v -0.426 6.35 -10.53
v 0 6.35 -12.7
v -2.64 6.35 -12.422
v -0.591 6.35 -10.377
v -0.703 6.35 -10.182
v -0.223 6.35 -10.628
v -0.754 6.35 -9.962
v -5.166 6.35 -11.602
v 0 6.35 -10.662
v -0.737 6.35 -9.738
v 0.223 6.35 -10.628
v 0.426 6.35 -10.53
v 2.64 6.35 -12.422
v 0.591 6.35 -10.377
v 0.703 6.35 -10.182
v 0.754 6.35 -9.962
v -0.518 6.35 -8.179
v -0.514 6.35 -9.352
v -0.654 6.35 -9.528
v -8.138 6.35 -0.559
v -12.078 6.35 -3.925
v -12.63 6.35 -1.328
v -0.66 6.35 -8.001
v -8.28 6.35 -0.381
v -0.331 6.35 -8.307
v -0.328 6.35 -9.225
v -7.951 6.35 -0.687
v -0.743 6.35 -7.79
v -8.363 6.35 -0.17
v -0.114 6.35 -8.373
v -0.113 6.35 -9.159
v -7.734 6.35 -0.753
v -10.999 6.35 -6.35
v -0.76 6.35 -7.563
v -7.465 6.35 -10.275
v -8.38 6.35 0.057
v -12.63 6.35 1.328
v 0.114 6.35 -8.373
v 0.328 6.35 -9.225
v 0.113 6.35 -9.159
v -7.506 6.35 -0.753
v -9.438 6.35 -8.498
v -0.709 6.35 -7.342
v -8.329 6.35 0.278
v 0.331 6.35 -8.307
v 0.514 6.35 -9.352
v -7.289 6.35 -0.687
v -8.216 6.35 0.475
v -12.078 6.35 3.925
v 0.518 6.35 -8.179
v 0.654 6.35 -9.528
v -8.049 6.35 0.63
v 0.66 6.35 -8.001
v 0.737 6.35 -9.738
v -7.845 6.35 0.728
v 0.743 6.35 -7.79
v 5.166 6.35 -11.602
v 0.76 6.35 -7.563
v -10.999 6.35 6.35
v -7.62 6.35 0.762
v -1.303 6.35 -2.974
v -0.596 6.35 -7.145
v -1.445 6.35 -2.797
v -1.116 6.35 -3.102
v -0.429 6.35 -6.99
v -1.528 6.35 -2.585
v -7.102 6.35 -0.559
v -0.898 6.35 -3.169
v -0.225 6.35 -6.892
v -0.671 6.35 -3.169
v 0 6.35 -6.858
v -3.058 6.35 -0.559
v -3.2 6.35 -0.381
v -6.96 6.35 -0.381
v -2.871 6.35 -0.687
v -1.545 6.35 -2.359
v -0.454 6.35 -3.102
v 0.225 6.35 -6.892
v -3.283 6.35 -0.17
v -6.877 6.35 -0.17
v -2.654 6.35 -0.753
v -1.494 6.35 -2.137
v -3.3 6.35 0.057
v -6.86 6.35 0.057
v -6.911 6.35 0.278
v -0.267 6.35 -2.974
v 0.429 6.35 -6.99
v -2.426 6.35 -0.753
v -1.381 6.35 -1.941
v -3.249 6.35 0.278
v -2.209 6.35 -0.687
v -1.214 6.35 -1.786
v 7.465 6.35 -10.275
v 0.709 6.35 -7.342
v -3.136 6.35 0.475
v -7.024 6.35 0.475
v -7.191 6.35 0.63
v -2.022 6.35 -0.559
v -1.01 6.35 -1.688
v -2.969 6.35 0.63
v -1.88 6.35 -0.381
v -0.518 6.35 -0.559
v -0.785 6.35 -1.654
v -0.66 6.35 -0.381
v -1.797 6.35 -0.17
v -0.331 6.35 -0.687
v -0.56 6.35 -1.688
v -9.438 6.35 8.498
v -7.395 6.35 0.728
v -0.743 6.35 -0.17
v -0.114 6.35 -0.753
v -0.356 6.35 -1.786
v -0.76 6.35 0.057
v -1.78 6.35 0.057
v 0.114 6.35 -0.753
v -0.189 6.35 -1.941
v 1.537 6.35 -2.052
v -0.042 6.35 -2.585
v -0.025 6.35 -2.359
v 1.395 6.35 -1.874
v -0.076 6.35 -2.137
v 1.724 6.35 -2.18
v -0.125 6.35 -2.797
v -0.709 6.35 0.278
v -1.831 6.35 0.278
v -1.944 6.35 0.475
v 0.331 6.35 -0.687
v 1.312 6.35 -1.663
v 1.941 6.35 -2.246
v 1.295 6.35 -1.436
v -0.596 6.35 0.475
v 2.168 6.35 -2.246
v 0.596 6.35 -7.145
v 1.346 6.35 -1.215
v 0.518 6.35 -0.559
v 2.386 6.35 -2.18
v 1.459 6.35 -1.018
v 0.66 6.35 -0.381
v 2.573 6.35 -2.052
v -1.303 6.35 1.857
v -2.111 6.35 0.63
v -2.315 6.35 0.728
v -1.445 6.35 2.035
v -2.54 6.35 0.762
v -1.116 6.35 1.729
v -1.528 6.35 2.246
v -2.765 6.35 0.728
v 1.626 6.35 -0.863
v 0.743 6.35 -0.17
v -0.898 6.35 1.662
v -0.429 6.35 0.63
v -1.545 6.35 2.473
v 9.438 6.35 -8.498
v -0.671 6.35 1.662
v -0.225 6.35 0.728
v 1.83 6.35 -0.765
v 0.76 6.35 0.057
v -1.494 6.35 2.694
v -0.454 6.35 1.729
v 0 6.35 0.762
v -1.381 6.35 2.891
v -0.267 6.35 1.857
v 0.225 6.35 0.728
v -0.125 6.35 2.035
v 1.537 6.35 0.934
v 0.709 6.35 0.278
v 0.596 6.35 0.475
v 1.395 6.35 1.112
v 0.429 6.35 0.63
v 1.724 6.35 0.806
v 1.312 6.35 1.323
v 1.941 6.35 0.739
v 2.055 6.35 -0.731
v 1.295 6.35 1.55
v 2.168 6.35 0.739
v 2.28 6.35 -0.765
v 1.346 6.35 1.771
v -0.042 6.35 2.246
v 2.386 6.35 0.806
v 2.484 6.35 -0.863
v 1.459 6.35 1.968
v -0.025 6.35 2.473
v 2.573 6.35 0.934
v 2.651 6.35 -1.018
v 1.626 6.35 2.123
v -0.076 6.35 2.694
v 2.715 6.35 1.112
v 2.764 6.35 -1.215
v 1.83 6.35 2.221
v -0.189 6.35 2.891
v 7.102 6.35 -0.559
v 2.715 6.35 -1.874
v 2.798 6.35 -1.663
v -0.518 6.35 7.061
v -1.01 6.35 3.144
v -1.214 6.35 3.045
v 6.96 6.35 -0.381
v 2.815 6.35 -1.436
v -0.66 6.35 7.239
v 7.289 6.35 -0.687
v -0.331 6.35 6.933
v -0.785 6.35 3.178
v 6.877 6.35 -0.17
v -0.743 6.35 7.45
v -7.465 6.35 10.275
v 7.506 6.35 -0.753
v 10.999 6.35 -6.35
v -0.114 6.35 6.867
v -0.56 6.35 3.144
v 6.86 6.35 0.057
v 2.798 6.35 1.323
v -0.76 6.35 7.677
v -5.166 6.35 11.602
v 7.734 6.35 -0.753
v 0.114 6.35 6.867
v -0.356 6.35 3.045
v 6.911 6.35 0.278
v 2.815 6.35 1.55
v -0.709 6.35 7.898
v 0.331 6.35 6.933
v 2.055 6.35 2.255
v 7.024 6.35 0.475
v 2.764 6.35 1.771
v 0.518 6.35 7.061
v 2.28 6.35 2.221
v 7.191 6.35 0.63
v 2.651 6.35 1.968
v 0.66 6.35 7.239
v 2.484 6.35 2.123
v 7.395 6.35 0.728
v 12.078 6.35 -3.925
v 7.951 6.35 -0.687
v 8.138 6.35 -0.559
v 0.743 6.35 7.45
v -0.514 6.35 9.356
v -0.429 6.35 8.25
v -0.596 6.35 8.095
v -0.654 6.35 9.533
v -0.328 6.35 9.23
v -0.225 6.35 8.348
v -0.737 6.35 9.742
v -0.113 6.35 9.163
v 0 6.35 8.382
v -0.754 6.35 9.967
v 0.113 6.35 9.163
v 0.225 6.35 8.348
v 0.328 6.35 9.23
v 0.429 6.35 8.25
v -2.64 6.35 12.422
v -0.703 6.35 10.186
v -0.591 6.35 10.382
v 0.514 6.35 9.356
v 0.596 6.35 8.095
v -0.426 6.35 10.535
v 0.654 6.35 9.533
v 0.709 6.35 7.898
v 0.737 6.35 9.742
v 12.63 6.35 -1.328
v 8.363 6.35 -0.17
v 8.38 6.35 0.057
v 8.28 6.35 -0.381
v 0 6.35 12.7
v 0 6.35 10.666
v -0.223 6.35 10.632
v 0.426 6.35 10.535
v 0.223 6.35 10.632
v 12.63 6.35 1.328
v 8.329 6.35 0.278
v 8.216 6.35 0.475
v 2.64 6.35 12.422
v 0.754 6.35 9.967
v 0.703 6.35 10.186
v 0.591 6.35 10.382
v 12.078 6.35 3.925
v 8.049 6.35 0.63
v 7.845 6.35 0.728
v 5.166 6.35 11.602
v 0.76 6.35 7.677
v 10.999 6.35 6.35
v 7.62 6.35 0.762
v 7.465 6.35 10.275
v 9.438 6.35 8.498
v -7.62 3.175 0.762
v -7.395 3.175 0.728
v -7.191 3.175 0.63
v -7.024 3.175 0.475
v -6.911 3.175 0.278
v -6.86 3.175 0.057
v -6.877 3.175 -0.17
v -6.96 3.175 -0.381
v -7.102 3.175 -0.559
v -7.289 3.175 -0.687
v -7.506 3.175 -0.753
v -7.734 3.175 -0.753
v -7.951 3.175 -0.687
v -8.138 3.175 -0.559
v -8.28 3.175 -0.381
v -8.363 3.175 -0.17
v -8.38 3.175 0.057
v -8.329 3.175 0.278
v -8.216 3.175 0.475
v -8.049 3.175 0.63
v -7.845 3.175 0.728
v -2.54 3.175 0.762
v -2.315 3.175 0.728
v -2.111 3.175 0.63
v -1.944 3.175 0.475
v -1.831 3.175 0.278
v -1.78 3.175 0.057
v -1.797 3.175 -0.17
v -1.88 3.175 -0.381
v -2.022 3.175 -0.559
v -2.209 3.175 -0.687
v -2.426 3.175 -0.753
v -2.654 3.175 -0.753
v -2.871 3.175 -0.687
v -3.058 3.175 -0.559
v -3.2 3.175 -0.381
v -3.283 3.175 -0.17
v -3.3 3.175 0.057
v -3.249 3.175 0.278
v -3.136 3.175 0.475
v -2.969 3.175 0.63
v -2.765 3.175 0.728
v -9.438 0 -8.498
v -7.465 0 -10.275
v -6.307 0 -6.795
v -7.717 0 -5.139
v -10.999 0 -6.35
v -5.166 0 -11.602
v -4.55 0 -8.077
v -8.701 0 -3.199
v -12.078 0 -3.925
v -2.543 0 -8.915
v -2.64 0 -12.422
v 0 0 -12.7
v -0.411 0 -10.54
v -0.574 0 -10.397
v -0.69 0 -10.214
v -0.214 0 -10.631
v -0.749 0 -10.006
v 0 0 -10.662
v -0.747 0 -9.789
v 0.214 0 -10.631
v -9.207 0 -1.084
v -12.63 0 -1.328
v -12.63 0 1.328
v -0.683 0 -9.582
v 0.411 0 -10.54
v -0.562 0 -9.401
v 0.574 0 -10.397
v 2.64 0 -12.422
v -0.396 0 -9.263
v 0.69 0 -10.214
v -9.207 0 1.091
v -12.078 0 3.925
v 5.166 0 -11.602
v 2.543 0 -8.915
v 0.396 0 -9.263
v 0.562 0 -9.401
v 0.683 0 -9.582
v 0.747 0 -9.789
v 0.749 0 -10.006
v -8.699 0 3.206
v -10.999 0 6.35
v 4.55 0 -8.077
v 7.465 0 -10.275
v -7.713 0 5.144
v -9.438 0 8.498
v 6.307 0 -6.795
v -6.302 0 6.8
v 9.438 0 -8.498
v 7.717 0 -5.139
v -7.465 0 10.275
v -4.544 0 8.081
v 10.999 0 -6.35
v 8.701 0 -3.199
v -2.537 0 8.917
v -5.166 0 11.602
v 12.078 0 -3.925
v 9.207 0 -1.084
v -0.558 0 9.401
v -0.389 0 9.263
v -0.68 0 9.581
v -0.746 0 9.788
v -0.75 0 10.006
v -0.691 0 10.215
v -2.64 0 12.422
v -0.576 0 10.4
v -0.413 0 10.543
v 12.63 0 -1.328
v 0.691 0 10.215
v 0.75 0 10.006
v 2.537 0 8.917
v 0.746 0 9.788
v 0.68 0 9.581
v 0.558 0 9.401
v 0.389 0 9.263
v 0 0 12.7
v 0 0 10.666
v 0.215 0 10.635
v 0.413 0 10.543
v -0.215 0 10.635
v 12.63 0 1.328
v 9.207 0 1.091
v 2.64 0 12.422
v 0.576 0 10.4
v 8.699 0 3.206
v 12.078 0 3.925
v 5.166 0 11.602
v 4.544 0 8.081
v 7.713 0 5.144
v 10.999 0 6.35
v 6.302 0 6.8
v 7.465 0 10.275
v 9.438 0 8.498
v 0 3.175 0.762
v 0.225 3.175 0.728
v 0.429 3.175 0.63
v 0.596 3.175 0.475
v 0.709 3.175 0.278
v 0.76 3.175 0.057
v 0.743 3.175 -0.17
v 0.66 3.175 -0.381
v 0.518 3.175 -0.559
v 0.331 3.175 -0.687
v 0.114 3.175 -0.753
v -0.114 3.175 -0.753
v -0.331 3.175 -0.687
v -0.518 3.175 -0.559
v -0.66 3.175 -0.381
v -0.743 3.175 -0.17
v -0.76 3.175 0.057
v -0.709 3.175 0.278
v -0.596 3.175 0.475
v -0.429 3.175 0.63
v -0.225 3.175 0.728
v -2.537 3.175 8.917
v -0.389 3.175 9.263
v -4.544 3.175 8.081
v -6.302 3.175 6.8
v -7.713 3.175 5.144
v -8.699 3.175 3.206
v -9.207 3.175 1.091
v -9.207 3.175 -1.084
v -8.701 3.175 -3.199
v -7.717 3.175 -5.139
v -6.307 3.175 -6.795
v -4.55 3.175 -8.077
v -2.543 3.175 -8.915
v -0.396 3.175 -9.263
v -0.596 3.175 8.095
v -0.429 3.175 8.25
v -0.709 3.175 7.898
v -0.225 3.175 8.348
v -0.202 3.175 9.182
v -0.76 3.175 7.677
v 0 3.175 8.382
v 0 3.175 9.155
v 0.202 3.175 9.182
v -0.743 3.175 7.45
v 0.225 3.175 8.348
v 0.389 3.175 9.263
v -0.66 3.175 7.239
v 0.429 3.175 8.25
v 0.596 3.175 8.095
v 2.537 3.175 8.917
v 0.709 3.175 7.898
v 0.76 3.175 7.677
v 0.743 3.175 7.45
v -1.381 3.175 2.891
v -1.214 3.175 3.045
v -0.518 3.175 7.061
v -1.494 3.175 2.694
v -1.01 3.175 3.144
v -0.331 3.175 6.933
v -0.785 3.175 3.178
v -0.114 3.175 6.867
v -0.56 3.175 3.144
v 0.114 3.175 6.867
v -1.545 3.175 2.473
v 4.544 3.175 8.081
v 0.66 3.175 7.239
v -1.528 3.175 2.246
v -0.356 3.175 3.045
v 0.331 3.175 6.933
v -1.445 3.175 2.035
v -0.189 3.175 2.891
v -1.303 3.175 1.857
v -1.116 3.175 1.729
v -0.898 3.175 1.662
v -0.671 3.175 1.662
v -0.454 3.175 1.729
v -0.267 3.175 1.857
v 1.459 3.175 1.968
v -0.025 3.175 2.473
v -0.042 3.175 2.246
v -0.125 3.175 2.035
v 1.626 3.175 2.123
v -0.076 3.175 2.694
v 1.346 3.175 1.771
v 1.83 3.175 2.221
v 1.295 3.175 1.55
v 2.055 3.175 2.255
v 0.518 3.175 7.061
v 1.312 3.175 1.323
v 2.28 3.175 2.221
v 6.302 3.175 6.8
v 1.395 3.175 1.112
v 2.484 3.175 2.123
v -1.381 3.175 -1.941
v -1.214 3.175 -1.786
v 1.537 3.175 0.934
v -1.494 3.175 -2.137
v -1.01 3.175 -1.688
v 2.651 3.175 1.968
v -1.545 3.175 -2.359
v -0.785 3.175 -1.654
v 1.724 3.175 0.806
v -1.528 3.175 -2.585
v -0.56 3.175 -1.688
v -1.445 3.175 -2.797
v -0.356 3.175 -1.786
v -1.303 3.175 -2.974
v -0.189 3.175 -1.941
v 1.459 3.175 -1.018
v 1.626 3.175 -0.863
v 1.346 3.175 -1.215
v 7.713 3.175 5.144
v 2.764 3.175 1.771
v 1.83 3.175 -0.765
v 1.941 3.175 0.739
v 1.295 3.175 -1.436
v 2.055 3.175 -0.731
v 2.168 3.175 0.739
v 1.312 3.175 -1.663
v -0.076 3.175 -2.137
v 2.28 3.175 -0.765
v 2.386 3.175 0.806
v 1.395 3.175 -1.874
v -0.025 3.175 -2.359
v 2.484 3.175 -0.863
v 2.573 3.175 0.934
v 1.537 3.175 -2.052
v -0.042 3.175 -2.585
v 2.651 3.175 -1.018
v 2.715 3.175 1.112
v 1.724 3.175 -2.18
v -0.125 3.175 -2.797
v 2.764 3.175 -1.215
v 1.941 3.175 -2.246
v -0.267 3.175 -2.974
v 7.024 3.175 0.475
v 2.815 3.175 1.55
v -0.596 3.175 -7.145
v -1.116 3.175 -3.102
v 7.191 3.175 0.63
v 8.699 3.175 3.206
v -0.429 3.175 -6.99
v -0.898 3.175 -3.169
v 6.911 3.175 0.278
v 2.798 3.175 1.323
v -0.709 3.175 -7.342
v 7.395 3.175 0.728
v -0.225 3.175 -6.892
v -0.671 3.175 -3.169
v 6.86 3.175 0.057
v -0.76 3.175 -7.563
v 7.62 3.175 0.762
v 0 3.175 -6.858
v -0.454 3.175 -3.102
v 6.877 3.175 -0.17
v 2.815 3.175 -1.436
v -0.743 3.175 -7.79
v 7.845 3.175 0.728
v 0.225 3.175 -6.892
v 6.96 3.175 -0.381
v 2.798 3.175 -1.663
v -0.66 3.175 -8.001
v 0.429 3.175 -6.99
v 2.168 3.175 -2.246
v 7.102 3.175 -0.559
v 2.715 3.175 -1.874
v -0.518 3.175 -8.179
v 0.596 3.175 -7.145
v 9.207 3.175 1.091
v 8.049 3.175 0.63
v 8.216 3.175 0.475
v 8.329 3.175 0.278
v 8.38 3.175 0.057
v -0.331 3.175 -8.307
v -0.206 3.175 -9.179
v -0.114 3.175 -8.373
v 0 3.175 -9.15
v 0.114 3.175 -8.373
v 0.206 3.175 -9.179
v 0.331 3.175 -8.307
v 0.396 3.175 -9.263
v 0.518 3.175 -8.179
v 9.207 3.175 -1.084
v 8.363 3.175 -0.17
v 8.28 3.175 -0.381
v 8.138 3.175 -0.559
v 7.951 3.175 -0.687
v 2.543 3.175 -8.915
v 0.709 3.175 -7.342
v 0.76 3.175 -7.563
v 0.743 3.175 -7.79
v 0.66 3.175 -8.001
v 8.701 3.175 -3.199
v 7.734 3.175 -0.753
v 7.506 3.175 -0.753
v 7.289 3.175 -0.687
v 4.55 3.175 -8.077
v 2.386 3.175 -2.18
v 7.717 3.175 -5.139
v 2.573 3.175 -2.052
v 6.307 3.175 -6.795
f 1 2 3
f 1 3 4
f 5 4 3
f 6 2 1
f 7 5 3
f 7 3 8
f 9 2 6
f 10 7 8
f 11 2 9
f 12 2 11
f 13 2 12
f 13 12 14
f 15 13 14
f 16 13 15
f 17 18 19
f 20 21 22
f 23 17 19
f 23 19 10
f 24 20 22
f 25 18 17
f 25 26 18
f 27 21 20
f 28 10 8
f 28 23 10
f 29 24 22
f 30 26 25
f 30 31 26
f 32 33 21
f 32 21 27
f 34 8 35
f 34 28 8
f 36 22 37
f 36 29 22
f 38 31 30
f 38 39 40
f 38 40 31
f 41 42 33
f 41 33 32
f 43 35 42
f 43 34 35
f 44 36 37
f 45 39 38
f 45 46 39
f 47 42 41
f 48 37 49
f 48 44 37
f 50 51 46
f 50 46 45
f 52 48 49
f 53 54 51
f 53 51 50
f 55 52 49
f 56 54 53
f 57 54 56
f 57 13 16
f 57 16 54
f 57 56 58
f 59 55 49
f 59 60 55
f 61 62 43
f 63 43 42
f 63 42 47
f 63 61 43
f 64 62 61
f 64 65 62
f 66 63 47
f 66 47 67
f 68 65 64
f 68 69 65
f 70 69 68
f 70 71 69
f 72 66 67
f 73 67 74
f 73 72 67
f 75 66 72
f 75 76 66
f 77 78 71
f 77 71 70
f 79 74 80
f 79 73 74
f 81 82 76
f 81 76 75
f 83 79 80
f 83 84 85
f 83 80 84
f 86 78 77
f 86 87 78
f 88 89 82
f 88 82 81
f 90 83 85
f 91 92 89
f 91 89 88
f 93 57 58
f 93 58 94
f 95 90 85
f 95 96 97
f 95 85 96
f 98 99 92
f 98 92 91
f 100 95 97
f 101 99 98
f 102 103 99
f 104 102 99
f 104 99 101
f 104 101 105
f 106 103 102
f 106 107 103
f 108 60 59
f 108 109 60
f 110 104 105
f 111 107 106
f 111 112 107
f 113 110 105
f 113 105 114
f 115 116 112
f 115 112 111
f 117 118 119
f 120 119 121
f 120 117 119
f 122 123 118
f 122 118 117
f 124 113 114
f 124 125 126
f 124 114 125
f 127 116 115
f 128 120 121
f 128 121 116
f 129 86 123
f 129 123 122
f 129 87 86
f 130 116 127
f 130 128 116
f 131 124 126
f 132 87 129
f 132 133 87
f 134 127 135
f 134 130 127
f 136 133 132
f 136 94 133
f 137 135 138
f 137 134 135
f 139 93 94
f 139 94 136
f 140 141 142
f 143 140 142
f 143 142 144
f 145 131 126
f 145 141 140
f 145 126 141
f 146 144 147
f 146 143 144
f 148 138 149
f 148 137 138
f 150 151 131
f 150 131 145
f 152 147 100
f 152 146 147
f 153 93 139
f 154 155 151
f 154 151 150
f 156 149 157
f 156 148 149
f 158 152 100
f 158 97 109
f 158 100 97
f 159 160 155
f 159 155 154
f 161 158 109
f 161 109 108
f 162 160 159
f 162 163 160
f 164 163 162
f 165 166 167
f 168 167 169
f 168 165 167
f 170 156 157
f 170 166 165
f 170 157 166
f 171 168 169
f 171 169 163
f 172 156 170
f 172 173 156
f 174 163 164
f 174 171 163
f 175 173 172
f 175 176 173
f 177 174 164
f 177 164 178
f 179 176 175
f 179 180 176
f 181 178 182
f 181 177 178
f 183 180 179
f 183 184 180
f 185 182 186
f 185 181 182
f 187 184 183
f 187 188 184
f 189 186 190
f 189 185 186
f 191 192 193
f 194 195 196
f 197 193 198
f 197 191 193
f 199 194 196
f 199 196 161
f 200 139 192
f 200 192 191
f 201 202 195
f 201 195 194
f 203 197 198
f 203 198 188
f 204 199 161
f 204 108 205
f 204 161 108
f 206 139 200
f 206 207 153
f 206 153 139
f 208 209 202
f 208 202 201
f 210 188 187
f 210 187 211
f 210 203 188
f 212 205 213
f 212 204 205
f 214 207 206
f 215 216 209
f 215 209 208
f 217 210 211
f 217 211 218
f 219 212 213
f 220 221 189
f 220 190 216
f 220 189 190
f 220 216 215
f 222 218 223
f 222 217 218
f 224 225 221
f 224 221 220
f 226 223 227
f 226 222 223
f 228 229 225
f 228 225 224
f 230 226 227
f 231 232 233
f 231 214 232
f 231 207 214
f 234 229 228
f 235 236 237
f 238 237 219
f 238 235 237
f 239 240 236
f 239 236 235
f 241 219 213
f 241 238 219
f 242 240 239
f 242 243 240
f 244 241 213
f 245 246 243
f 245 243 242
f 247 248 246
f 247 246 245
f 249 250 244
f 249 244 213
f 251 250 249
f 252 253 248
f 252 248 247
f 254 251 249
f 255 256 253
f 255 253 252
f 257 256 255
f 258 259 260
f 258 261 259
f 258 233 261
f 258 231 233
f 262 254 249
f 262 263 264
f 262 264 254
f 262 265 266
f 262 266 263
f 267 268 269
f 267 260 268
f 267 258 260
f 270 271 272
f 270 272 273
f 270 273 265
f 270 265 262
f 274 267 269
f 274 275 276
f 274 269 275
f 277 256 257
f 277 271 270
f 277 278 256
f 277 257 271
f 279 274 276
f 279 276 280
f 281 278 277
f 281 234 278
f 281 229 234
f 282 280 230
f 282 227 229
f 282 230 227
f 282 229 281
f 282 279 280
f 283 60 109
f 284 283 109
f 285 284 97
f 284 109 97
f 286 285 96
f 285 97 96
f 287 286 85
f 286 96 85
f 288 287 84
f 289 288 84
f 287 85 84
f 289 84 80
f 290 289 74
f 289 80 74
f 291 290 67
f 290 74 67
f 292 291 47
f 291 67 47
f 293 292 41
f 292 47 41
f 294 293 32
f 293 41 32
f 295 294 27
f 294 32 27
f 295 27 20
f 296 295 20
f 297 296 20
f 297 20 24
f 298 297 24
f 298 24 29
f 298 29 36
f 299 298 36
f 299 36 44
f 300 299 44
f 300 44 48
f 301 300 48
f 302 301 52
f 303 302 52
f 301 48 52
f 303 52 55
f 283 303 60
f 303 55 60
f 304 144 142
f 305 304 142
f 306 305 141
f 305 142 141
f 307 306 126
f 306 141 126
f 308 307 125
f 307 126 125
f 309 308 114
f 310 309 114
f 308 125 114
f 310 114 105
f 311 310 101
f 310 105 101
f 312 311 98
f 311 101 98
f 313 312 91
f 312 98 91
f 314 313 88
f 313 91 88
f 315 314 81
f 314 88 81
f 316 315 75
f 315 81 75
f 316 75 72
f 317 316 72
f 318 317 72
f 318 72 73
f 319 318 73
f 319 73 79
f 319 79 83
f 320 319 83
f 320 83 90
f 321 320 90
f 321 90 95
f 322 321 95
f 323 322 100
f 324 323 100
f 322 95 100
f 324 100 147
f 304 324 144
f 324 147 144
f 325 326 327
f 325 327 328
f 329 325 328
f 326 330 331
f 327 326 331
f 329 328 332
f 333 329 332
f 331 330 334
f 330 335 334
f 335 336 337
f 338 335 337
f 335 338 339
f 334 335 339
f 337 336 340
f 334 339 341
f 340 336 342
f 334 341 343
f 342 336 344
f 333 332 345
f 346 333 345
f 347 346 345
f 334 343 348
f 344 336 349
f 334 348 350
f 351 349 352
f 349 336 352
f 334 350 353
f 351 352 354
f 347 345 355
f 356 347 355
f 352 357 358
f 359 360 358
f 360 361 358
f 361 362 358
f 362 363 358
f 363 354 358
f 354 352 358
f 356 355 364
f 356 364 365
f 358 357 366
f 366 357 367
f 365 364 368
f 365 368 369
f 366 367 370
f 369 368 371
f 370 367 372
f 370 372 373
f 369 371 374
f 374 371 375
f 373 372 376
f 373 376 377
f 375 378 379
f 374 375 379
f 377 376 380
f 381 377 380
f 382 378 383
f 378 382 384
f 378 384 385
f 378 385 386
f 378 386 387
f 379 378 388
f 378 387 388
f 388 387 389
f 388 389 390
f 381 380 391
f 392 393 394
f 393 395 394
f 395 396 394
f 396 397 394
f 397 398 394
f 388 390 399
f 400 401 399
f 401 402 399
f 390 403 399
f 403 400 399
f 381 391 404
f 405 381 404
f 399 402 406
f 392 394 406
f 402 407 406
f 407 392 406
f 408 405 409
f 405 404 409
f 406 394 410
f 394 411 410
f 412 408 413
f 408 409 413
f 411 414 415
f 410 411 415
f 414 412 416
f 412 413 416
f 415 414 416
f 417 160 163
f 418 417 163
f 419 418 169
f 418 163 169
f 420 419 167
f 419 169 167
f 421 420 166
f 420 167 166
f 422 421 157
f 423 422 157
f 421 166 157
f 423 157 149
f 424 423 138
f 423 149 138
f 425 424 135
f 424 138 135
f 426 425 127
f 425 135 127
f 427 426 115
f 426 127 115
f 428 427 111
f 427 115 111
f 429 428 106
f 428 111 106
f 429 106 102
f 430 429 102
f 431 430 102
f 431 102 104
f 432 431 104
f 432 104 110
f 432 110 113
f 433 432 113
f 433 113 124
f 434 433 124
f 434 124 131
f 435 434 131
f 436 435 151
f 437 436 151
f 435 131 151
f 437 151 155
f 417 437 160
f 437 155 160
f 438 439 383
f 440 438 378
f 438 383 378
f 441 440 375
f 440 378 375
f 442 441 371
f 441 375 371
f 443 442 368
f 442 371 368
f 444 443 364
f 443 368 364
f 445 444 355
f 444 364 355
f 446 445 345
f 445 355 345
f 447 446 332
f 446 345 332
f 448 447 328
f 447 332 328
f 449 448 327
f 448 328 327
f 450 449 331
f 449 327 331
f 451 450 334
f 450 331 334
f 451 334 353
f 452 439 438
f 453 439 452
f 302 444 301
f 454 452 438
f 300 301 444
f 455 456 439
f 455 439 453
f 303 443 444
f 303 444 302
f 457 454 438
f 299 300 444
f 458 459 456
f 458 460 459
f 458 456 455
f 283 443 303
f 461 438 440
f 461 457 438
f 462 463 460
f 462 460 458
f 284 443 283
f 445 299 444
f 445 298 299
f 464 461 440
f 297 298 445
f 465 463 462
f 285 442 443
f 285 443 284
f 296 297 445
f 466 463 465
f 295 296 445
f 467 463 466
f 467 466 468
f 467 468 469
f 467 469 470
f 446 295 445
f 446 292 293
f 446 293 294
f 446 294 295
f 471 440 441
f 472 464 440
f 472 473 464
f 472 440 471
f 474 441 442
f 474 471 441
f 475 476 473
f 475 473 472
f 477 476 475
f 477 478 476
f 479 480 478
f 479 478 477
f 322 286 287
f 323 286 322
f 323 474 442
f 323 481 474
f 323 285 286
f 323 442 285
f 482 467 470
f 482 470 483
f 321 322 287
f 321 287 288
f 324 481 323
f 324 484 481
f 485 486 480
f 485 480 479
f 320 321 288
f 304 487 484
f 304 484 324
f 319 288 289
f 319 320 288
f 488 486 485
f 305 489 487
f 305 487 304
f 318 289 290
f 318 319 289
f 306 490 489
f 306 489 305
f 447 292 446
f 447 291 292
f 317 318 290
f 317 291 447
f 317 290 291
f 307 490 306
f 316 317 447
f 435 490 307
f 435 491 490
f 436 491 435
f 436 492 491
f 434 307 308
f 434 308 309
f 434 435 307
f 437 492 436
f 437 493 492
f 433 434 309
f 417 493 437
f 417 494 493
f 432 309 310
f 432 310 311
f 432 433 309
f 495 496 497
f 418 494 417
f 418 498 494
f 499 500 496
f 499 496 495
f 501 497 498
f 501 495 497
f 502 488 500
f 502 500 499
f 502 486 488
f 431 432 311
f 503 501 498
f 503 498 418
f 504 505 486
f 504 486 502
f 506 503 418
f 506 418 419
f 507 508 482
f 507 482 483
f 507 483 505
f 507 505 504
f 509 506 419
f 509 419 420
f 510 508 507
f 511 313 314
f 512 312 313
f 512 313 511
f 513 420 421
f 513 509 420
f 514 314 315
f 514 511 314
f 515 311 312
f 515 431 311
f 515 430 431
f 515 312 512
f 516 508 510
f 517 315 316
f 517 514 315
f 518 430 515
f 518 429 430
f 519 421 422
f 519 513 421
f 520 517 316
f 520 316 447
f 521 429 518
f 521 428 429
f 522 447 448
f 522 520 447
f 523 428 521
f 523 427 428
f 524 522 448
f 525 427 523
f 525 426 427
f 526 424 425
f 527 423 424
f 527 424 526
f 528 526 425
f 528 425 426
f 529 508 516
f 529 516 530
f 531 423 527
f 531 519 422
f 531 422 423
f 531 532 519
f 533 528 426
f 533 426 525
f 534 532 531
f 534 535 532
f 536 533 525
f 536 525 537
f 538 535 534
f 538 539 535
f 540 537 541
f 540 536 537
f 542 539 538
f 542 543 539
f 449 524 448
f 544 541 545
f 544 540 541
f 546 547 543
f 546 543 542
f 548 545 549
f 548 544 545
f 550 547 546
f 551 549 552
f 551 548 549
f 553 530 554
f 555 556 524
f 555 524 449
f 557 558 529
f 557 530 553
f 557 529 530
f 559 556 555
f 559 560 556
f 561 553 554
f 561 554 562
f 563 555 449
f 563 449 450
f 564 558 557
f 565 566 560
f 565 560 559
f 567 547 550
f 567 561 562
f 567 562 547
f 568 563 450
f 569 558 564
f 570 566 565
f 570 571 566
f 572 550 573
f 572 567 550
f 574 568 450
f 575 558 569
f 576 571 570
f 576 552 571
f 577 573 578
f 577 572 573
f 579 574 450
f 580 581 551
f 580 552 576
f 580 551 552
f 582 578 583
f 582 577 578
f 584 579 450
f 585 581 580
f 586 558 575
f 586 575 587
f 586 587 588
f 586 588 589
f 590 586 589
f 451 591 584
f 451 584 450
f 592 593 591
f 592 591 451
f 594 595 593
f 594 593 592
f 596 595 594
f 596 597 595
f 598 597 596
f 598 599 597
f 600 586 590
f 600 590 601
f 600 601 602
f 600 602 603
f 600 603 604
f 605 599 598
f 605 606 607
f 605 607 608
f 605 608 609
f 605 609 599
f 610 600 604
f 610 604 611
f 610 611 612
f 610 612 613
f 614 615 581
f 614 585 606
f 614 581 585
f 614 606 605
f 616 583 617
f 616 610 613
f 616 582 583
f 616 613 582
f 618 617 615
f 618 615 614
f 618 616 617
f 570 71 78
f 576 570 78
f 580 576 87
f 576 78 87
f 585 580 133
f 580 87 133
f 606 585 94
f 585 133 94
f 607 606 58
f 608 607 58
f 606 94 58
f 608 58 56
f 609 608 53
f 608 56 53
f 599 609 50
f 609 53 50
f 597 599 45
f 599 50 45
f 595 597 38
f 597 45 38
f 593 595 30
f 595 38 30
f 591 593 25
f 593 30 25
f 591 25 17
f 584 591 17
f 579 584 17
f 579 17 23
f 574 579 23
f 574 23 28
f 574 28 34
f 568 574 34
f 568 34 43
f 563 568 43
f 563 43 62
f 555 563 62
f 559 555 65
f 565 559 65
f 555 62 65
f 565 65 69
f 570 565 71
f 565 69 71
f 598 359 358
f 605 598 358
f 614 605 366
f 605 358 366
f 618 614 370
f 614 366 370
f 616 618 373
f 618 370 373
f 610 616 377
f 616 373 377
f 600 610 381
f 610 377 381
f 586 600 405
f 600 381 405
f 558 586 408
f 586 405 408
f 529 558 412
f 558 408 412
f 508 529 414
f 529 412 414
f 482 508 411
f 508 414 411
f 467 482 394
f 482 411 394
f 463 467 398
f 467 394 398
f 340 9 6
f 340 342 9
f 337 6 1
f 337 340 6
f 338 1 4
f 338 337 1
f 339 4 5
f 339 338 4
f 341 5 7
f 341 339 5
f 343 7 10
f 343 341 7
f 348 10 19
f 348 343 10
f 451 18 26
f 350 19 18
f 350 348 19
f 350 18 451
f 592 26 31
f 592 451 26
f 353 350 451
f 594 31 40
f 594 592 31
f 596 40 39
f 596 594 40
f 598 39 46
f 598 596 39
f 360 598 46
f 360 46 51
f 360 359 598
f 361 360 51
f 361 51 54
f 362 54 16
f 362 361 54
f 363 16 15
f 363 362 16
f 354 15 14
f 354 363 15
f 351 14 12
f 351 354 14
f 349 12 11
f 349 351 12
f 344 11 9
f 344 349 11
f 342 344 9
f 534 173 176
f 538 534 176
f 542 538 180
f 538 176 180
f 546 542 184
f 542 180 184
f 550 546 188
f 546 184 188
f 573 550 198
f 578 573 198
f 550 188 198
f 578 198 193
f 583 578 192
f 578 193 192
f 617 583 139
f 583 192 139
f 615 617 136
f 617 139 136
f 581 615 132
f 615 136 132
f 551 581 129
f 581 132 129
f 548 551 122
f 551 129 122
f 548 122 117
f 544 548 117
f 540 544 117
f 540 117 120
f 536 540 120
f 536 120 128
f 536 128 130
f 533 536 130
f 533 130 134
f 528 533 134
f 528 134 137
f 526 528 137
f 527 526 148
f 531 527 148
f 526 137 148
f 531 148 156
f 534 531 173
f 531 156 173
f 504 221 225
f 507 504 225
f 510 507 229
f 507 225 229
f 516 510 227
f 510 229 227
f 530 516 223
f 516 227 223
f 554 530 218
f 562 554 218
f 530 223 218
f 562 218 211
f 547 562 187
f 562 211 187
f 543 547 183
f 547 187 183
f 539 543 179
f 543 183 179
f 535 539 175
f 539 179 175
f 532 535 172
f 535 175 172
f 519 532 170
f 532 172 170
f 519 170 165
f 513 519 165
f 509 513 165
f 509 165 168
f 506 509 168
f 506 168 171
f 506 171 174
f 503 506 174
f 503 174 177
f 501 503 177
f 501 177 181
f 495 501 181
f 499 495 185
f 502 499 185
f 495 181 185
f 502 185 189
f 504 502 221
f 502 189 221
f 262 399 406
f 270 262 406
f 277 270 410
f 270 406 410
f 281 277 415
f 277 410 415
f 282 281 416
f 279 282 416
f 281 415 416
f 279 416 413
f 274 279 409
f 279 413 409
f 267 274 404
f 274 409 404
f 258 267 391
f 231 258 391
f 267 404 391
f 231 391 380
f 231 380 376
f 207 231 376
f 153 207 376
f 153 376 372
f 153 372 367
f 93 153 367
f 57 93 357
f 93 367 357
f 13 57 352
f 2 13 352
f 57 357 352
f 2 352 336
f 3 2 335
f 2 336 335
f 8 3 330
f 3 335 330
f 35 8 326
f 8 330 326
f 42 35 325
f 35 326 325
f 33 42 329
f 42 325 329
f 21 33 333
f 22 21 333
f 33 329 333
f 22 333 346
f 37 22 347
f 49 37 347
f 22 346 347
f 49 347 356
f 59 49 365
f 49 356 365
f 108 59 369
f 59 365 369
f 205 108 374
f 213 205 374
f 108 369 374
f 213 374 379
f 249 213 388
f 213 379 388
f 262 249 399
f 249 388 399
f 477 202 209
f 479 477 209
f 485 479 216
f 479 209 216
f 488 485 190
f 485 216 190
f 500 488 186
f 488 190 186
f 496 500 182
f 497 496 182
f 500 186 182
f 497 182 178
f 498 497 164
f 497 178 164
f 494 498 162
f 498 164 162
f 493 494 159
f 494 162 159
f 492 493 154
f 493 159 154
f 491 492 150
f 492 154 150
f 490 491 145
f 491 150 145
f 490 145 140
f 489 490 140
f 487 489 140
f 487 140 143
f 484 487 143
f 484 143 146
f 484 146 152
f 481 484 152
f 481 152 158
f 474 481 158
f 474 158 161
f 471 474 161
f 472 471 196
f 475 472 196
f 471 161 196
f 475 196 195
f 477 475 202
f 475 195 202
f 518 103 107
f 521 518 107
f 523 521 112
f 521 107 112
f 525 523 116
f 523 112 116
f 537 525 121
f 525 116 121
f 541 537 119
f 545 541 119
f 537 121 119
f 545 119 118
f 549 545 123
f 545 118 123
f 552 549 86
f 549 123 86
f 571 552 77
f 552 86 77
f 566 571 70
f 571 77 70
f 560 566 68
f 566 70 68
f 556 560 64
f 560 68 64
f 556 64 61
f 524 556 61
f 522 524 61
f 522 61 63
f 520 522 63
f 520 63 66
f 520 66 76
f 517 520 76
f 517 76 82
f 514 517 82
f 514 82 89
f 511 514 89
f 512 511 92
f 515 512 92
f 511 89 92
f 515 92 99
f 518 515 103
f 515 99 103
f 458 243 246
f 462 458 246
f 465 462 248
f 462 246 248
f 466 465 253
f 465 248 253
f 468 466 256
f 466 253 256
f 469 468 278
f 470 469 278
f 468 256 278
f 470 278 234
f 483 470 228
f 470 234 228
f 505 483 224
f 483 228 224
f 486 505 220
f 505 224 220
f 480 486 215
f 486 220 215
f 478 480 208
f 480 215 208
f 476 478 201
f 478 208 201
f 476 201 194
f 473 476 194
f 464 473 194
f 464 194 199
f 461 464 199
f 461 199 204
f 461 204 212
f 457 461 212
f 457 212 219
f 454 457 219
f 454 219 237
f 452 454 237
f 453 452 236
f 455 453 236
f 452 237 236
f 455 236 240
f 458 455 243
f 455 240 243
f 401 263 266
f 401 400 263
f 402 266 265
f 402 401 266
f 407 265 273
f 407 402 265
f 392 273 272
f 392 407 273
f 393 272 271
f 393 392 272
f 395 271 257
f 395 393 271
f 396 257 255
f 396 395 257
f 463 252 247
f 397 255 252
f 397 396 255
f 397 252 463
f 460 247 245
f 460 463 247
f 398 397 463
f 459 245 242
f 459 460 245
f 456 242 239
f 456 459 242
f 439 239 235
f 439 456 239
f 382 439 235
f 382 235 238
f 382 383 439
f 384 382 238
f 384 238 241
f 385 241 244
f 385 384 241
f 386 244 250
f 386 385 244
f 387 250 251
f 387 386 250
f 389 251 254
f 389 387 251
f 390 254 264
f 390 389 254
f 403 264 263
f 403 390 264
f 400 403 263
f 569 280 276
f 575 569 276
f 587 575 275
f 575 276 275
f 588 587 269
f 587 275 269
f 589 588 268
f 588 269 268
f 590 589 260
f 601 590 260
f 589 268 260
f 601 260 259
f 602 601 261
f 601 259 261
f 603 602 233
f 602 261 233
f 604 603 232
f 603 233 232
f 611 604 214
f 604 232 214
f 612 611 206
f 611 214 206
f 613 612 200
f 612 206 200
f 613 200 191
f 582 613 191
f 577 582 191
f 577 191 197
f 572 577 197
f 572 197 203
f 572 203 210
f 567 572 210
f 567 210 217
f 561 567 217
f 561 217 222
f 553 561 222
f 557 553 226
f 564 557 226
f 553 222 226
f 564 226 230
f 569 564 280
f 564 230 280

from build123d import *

# Parameters (mm, degrees)
SKETCH1_R           = 12.7
BOSS_EXTRUDE1_DEPTH = 6.35
SKETCH2_R           = 9.271
CUT_EXTRUDE1_DEPTH  = 3.175
CIRPATTERN1_COUNT   = 2
SKETCH6_R           = 0.762
CUT_EXTRUDE2_DEPTH  = 3.175


with BuildPart() as part:
    # Sketch1 → Boss-Extrude1 (new body)
    with BuildSketch(Plane(origin=(0, 0, 0), x_dir=(1, 0, 0), z_dir=(0, 1, 0))):
        with Locations(Location((0, 0, 0), (0, 0, 270))):
            Circle(SKETCH1_R)
    extrude(amount=BOSS_EXTRUDE1_DEPTH)

    # Sketch2 → Cut-Extrude1 (cut)
    with BuildSketch(Plane.XZ):
        with Locations(Location((0, 0, 0), (0, 0, 270))):
            Circle(SKETCH2_R)
    extrude(amount=-CUT_EXTRUDE1_DEPTH, mode=Mode.SUBTRACT)

    # Sketch5 → #1-72 Tapped Hole1 (revolve, cut)
    with BuildSketch(Plane(origin=(0, 0, -9.906), x_dir=(0, 0, -1), z_dir=(1, 0, 0))):
        Polygon((0, 0), (0, 11.630040327), (0.75565, 11.176), (0.75565, 0), align=None)
    f_1_72_tapped_hole1 = revolve(axis=Axis((0, -6.35, -9.906), (0, 1, 0)), mode=Mode.SUBTRACT)

    # CirPattern1: #1-72 Tapped Hole1 ×2 about axis
    cirpattern1_axis = Axis((0, 0, 0.002208913), (0, 1, 0))
    for i in range(1, CIRPATTERN1_COUNT):
        add(f_1_72_tapped_hole1.rotate(cirpattern1_axis, i * 360 / CIRPATTERN1_COUNT), mode=Mode.SUBTRACT)

    # Sketch6 → Cut-Extrude2 (cut)
    with BuildSketch(Plane(origin=(0, 6.35, 0), x_dir=(1, 0, 0), z_dir=(0, 1, 0))):
        with Locations(Location((0, 0, 0), (0, 0, 270))):
            Circle(SKETCH6_R)
        with Locations(Location((-2.54, 0, 0), (0, 0, 270))):
            Circle(SKETCH6_R)
        with Locations(Location((-0.784903166, 2.415683551, 0), (0, 0, 270))):
            Circle(SKETCH6_R)
        with Locations(Location((2.054903166, 1.492974541, 0), (0, 0, 270))):
            Circle(SKETCH6_R)
        with Locations(Location((2.054903166, -1.492974541, 0), (0, 0, 270))):
            Circle(SKETCH6_R)
        with Locations(Location((-0.784903166, -2.415683551, 0), (0, 0, 270))):
            Circle(SKETCH6_R)
        with Locations(Location((0, 7.62, 0), (0, 0, 270))):
            Circle(SKETCH6_R)
        with Locations(Location((7.62, 0, 0), (0, 0, 270))):
            Circle(SKETCH6_R)
        with Locations(Location((0, -7.62, 0), (0, 0, 270))):
            Circle(SKETCH6_R)
        with Locations(Location((-7.62, 0, 0), (0, 0, 270))):
            Circle(SKETCH6_R)
    extrude(amount=-CUT_EXTRUDE2_DEPTH, mode=Mode.SUBTRACT)


solid = part.part
